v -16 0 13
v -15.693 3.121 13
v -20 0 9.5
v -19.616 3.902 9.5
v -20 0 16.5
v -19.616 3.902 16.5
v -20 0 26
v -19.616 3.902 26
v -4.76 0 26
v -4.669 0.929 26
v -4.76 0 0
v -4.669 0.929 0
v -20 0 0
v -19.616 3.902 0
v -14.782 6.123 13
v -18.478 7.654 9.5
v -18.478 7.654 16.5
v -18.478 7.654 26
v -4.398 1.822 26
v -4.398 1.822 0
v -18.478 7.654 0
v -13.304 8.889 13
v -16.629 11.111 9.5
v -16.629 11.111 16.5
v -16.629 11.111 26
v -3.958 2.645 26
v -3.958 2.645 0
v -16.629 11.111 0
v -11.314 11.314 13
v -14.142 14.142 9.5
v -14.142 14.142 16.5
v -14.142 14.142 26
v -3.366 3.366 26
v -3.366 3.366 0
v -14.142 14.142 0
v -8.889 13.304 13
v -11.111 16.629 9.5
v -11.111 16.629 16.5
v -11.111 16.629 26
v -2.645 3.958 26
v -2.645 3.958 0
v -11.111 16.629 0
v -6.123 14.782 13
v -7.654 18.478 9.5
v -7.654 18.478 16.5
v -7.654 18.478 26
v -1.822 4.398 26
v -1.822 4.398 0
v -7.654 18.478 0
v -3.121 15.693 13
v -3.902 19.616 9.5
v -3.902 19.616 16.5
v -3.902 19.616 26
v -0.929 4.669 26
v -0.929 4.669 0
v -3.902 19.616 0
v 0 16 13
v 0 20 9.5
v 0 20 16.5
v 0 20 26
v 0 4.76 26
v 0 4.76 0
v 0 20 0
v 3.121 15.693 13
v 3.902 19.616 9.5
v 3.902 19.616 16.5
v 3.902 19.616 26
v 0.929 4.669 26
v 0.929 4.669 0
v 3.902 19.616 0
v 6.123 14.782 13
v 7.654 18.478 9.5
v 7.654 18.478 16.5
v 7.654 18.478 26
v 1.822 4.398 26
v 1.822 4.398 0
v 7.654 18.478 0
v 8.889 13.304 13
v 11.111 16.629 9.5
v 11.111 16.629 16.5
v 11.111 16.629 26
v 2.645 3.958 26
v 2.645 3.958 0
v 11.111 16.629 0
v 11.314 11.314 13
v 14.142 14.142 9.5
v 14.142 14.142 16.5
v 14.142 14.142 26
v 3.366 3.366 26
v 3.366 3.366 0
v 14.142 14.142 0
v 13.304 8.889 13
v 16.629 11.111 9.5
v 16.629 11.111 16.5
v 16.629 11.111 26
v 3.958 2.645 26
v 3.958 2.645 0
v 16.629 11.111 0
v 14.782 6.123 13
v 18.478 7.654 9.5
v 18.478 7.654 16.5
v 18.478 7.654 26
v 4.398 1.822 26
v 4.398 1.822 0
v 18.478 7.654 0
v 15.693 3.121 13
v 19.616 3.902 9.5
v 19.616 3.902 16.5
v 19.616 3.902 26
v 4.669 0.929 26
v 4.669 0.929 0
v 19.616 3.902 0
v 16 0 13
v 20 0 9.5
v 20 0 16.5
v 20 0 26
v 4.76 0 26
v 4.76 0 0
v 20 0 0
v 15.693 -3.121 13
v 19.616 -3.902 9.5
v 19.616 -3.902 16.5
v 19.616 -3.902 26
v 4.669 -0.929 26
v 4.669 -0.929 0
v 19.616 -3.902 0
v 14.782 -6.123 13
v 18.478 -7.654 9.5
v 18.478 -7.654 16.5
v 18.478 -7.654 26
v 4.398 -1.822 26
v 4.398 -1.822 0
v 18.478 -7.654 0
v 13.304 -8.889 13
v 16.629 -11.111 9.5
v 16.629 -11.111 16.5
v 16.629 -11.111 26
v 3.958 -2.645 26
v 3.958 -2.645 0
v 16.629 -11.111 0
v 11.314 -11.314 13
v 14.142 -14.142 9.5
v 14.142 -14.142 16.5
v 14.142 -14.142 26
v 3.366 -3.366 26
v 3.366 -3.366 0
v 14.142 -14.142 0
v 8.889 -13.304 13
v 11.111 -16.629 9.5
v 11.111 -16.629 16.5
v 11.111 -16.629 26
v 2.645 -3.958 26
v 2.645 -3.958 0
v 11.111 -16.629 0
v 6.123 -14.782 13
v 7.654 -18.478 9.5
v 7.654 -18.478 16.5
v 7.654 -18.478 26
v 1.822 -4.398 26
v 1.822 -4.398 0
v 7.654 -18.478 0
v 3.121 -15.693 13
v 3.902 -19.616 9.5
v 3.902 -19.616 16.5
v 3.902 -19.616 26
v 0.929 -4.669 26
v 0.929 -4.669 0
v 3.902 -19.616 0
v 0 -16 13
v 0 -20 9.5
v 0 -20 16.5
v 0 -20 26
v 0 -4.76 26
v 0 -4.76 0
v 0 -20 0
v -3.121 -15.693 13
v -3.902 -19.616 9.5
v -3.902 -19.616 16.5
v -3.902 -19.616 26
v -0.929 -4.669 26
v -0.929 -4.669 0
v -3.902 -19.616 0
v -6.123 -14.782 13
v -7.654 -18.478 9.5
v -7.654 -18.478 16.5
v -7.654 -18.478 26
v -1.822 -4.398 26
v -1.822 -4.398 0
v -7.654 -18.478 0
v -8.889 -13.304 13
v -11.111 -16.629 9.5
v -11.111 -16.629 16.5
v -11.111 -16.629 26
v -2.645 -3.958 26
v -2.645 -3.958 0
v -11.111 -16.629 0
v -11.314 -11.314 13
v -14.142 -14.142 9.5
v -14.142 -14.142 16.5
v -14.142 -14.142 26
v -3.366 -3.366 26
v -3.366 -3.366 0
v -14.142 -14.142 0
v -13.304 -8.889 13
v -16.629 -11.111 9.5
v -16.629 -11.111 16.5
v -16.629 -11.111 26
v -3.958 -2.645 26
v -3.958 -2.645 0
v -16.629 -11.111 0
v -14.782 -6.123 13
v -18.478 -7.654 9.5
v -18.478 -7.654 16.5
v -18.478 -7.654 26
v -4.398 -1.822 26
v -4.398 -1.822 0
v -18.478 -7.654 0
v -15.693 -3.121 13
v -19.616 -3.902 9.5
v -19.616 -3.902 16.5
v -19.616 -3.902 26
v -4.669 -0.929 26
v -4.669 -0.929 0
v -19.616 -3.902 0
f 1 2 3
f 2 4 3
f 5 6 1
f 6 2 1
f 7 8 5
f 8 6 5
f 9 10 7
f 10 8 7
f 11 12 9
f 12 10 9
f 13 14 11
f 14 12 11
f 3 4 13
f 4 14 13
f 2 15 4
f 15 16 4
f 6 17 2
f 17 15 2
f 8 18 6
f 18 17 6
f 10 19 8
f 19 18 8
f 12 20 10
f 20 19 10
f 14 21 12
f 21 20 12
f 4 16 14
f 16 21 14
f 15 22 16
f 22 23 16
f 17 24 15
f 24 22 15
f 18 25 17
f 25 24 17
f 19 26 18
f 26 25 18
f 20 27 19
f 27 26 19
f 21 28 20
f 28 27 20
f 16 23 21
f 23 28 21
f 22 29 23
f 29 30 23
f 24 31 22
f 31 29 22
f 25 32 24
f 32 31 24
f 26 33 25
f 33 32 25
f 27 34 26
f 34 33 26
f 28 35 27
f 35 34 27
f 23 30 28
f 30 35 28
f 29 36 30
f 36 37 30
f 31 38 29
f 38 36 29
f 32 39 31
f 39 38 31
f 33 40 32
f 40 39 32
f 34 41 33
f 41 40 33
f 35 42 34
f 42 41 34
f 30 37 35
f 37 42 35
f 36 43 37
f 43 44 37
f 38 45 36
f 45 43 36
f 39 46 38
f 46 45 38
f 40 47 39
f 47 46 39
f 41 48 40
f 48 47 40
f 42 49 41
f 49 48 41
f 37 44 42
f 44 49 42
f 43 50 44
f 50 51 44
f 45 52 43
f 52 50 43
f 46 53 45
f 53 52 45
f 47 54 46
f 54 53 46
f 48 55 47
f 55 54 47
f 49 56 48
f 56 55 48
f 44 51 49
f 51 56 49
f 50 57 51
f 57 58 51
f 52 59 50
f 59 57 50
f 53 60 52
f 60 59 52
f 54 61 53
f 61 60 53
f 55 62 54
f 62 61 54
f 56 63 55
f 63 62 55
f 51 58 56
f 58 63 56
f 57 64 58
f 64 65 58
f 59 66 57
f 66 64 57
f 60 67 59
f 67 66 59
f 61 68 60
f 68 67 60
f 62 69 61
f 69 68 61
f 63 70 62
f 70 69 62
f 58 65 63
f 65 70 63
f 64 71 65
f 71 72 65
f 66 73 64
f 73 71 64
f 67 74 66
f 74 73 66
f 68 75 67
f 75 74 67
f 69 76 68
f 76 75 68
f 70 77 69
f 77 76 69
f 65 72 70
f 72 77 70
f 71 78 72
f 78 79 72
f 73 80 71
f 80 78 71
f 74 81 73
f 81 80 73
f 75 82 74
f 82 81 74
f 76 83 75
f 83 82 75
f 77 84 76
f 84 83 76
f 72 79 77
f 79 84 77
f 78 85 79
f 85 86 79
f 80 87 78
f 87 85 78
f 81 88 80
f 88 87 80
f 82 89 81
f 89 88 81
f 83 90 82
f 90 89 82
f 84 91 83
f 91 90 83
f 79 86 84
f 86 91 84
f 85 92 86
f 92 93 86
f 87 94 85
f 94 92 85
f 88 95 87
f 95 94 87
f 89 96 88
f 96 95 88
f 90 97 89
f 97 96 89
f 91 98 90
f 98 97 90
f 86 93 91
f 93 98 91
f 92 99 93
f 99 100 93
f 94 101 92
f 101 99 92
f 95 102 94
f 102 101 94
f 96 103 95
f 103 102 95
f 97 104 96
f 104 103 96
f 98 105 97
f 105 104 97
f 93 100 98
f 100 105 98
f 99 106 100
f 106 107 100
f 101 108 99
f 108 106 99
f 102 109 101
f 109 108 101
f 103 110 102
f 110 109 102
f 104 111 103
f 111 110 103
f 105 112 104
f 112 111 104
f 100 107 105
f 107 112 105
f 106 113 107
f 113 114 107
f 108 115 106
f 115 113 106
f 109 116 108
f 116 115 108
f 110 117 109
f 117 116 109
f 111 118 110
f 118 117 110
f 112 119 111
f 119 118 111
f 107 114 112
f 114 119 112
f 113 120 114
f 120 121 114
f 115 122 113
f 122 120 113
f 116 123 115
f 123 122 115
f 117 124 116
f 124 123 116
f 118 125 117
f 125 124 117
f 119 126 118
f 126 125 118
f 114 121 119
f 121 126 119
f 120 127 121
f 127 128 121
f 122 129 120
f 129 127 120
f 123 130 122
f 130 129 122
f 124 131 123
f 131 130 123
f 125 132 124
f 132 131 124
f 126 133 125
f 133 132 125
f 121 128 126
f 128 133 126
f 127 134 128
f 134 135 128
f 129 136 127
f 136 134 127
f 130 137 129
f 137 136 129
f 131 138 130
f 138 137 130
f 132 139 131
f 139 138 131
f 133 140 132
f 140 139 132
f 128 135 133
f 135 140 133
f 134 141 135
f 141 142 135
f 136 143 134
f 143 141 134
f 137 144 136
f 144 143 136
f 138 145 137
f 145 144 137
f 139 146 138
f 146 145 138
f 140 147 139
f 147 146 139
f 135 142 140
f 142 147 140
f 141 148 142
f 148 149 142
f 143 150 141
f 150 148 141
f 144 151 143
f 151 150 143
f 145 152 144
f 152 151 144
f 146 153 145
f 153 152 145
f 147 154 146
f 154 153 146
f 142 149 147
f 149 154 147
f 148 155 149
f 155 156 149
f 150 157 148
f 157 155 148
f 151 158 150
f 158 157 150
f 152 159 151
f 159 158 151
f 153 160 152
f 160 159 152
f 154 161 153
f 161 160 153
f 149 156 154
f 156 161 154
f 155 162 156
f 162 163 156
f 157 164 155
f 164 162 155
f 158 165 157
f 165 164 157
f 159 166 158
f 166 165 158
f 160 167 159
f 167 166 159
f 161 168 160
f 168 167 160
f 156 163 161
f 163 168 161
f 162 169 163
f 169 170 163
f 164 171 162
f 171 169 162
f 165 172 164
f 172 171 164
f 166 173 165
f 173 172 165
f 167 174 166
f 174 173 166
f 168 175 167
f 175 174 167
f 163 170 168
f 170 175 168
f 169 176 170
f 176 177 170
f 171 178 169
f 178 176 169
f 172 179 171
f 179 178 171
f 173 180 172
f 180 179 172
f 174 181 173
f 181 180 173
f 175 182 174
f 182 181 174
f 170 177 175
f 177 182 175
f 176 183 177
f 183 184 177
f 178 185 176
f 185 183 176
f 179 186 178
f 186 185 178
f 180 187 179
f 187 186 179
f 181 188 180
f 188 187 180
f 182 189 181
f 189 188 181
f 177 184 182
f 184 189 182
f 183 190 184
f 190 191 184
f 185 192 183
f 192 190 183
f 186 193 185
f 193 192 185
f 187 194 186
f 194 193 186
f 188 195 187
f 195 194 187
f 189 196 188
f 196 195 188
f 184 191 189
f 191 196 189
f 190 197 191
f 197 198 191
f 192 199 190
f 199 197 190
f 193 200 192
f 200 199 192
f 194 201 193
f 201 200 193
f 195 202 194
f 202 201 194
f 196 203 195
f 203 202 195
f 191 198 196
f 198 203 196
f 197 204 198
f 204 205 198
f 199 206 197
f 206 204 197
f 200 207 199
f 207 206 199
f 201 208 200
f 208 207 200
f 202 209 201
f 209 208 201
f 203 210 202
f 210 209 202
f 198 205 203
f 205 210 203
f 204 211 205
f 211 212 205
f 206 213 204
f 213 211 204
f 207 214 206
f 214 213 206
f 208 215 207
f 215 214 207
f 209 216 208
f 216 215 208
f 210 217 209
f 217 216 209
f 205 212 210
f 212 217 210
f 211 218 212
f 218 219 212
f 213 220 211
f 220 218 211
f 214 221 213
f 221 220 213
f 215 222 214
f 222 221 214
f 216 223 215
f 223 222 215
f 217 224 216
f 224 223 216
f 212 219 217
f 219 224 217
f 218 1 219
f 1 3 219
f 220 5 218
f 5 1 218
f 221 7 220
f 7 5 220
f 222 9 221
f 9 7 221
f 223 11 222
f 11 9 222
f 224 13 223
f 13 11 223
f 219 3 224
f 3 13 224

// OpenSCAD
$fn = 32;

// ----------------------------------------------------------------------
// Belt roller: 40 mm barrel, 26 mm wide, bore 9.52 mm
// ----------------------------------------------------------------------

// --- parameters (mm) ---
bore_d = 9.52;            // bore
barrel_d = 40;            // barrel diameter
roller_w = 26;            // roller width
groove_w = 7;             // guide groove width
groove_d = 4;             // guide groove depth

roller_profile = [[4.76, 0], [20, 0], [20, 9.5], [16, 13], [20, 16.5], [20, 26], [4.76, 26]];

/* the profile stays clear of the axis, so the bore comes out of the revolve */
rotate_extrude() polygon(roller_profile);
